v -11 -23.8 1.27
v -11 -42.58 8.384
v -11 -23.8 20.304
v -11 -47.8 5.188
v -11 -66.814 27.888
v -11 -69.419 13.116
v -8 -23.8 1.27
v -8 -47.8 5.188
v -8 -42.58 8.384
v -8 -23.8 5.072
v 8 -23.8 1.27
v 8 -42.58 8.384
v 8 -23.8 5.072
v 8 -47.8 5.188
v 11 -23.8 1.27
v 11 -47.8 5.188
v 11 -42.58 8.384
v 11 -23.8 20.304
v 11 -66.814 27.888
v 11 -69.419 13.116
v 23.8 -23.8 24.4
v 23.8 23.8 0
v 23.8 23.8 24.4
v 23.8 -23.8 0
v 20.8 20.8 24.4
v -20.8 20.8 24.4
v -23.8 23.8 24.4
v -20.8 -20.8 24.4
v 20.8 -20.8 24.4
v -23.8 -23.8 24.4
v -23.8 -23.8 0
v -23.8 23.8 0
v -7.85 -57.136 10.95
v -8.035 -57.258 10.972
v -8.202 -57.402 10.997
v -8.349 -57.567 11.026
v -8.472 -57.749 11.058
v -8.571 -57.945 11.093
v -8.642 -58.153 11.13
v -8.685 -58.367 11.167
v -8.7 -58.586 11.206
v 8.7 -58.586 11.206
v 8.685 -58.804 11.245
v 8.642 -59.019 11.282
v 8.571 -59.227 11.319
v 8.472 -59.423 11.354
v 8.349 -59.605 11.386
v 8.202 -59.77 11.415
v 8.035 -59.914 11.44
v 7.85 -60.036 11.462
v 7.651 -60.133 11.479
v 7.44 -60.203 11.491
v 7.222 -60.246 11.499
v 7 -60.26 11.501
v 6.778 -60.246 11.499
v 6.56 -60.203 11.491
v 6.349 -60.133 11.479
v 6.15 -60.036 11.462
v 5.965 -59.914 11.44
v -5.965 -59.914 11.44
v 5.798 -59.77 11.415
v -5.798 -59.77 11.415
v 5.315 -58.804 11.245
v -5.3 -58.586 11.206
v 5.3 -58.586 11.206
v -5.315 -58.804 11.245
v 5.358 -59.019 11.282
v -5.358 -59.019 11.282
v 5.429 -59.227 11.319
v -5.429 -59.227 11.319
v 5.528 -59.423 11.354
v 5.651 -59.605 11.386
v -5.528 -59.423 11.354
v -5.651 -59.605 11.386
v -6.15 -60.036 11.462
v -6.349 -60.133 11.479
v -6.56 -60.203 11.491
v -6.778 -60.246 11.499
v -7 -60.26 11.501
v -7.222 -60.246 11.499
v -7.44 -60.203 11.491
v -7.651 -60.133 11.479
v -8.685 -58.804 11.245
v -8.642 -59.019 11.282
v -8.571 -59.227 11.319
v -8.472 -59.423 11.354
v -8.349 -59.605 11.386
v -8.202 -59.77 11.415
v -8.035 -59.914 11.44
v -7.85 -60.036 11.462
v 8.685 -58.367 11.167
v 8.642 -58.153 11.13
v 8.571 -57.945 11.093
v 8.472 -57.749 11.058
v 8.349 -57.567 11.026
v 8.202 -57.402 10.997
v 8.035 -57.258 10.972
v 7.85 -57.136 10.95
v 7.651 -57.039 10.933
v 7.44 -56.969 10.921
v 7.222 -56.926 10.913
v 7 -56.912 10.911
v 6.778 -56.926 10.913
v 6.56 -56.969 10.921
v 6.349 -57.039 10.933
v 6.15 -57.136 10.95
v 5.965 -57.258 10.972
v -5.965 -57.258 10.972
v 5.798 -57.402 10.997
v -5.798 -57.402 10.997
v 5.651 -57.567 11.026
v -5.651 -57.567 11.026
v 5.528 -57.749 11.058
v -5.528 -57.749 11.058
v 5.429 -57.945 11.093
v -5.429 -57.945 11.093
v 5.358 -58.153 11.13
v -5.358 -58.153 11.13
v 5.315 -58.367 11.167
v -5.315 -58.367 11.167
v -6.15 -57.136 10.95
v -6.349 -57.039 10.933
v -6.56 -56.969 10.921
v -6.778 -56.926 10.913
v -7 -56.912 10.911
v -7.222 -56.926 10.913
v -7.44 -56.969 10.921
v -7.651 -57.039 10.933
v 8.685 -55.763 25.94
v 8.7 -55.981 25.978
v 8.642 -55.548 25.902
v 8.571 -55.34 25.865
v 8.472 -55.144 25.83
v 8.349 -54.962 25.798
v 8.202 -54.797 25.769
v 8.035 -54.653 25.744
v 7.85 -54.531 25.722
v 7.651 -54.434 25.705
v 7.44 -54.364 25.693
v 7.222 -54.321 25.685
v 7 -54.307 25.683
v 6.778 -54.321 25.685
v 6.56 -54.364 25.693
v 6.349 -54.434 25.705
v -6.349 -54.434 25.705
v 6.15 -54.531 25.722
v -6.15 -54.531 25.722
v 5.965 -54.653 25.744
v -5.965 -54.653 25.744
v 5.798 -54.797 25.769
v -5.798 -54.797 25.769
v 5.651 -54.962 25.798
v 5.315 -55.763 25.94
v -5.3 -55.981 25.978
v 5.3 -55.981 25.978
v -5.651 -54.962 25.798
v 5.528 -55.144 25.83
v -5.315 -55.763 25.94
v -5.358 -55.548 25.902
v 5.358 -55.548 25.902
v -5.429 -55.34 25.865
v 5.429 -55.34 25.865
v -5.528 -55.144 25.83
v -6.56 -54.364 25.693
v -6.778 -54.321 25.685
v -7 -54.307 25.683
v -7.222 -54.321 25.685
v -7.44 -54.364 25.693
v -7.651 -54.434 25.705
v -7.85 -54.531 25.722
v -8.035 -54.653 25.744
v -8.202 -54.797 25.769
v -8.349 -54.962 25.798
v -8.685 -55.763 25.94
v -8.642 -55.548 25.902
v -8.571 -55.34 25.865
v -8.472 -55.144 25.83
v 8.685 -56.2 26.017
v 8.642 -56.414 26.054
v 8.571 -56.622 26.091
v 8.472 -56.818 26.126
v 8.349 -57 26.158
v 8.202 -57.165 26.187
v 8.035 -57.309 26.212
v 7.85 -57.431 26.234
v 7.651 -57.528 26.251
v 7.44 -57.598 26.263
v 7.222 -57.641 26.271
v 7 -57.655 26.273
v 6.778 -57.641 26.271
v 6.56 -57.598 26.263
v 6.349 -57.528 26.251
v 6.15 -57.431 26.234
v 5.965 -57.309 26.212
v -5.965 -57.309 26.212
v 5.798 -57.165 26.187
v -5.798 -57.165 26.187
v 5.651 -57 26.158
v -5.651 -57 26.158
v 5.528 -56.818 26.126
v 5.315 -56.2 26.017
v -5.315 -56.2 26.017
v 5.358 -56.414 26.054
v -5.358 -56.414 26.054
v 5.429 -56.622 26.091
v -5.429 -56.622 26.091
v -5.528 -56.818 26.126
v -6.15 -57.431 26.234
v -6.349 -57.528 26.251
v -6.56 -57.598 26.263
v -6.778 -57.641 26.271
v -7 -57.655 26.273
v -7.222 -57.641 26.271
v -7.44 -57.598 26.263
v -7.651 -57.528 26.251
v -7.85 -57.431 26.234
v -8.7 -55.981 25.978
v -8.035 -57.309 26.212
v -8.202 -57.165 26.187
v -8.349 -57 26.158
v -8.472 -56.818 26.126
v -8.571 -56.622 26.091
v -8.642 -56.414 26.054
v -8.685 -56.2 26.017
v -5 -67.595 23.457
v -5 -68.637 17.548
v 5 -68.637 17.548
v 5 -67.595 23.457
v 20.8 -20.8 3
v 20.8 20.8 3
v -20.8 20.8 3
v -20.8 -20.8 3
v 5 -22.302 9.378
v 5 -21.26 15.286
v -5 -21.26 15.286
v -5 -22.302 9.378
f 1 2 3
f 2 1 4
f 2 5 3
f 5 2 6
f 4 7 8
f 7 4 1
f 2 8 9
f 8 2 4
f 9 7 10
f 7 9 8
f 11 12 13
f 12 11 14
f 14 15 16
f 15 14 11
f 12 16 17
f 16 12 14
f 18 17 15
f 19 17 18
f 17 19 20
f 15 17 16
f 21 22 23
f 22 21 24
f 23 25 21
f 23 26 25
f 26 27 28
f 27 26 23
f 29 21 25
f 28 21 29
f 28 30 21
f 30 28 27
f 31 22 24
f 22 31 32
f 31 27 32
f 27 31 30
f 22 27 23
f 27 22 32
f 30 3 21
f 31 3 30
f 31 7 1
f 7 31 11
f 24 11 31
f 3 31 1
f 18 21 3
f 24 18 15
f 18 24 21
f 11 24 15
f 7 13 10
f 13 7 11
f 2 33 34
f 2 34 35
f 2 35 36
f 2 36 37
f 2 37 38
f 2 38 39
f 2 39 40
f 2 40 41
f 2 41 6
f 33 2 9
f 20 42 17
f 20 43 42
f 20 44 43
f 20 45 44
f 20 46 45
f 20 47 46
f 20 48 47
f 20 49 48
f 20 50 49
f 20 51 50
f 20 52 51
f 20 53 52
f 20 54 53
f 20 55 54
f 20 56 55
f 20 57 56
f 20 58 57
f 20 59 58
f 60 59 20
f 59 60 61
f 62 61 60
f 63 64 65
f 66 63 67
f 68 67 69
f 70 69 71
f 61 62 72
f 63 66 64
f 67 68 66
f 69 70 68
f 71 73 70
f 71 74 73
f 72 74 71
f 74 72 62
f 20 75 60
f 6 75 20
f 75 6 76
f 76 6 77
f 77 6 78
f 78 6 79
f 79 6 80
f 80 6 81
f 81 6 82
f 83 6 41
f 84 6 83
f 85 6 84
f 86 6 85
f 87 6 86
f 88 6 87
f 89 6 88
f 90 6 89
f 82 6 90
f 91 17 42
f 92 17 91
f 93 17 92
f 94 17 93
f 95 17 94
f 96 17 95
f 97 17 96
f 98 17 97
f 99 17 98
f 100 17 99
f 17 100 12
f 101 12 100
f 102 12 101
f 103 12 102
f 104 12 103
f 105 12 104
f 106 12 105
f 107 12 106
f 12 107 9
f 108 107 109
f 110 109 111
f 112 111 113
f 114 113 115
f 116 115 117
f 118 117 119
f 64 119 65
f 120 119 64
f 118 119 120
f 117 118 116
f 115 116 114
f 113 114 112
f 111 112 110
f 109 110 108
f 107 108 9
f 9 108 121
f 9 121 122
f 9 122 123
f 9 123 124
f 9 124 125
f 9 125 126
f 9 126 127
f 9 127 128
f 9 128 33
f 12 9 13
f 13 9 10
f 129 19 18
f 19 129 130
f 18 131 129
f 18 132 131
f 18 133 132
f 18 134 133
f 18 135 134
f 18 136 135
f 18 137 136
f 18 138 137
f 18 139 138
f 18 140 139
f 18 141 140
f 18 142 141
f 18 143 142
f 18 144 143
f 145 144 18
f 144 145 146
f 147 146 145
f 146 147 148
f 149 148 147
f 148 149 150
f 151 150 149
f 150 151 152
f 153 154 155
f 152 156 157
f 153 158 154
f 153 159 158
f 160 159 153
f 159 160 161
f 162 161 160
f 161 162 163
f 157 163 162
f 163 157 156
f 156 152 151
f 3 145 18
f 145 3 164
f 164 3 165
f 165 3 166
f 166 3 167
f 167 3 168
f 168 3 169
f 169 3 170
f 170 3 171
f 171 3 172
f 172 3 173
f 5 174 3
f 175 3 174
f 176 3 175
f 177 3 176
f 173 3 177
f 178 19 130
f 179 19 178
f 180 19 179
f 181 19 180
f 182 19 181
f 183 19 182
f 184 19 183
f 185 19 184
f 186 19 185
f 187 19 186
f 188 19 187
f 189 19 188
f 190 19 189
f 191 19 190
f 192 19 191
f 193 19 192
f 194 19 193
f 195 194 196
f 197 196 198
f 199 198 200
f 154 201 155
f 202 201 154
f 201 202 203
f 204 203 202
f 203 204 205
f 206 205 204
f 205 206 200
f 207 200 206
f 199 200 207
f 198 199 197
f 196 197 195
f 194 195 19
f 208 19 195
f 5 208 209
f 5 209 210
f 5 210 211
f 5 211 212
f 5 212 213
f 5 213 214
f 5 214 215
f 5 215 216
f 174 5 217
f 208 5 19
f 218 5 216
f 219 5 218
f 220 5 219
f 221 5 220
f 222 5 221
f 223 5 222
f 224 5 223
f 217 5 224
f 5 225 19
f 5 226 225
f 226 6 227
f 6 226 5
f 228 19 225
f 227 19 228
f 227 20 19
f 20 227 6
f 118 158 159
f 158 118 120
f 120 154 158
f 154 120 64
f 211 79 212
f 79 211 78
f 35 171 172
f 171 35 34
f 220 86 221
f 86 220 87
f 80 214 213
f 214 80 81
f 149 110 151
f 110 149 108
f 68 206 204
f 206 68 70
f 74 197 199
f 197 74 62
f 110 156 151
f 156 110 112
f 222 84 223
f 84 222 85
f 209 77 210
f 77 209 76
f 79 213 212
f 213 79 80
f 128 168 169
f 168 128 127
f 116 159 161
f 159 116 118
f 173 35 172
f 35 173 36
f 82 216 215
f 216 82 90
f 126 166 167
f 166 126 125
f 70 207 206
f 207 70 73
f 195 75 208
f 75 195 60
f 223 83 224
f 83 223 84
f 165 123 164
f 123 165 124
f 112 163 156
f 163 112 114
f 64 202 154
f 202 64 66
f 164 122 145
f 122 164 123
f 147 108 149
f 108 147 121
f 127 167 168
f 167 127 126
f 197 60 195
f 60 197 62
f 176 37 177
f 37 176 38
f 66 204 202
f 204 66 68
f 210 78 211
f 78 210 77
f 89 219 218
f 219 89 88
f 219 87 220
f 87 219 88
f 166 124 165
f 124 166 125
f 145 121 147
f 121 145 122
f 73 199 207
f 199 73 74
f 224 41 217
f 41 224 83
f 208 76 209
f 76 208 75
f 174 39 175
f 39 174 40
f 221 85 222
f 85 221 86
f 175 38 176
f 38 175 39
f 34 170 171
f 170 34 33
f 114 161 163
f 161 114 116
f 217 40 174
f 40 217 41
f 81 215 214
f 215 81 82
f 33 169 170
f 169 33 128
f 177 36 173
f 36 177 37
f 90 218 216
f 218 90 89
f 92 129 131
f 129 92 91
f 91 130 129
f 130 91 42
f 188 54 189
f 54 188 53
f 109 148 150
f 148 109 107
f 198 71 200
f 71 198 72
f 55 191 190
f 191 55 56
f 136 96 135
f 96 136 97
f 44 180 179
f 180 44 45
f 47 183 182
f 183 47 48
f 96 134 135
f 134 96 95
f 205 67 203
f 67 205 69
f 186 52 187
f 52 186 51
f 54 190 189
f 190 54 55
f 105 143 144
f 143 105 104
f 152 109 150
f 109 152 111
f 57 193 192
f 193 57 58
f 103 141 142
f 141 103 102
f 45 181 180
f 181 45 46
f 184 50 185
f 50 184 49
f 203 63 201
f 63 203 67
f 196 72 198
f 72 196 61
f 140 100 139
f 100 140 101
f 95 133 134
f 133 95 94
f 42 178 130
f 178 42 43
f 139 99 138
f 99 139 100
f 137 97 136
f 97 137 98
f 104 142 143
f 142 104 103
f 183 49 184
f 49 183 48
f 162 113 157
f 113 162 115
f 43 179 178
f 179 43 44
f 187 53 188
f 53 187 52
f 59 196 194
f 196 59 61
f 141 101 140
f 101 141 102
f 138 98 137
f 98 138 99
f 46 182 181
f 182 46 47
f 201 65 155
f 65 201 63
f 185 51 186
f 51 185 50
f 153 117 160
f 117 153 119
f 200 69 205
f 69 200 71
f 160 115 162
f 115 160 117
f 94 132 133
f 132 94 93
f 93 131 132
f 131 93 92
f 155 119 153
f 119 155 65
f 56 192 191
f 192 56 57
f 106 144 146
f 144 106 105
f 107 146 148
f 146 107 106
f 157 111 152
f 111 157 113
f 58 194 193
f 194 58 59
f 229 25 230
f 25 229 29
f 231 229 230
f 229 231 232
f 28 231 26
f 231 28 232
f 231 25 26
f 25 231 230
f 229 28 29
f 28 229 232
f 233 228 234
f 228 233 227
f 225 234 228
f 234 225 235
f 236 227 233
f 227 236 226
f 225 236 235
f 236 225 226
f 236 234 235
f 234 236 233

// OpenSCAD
// Parametric open-top holder with an angled hollow handle.
// Units: millimeters.

$fn = 48;
eps = 0.05;

// Insert object.
insert_x = 41.0;
insert_y = 41.0;
insert_z = 21.0;

// Fit clearance. Start with 0.6 mm total XY clearance for FDM printing.
clearance_xy = 0.6;
clearance_z = 0.4;

// Holder shell.
wall = 3.0;
bottom = 3.0;

// Handle.
handle_length = 45.0;
handle_width = 22.0;
handle_height = 15.0;
handle_angle_deg = 100.0; // 90 = straight back, 100 = 10 degrees upward.
handle_root_overlap = 2.0;
handle_attach_z_ratio = 0.52;

// Cable channel inside the handle.
cable_channel_width = 10.0;
cable_channel_height = 6.0;

// Mounting holes through the handle. Disable if you will use a clamp instead.
use_mounting_holes = true;
mount_hole_diameter = 3.4; // M3 clearance hole.
mount_hole_spacing_x = 14.0;
mount_hole_distance_from_shell = 34.0;

// Print a small ring first to test whether the real 41 mm part fits.
build_fit_test_ring = false;
fit_test_height = 8.0;

inner_x = insert_x + clearance_xy;
inner_y = insert_y + clearance_xy;
inner_z = insert_z + clearance_z;

outer_x = inner_x + wall * 2;
outer_y = inner_y + wall * 2;
outer_z = inner_z + bottom;

handle_tilt_deg = handle_angle_deg - 90.0;
handle_attach_z = outer_z * handle_attach_z_ratio;

module shell_solid(height = outer_z) {
    translate([-outer_x / 2, -outer_y / 2, 0])
        cube([outer_x, outer_y, height]);
}

module shell_cavity_cut(height = outer_z) {
    translate([-inner_x / 2, -inner_y / 2, bottom])
        cube([inner_x, inner_y, height - bottom + 2 * eps]);
}

module handle_transform() {
    translate([0, -outer_y / 2, handle_attach_z])
        rotate([-handle_tilt_deg, 0, 0])
            children();
}

module handle_solid() {
    handle_transform()
        translate([-handle_width / 2, -handle_length, -handle_height / 2])
            cube([handle_width, handle_length + handle_root_overlap, handle_height]);
}

module cable_channel_cut() {
    handle_transform()
        translate([
            -cable_channel_width / 2,
            -handle_length - eps,
            -cable_channel_height / 2
        ])
            cube([
                cable_channel_width,
                handle_length + handle_root_overlap + 2 * eps,
                cable_channel_height
            ]);
}

module mounting_holes_cut() {
    if (use_mounting_holes) {
        handle_transform() {
            for (x = [-mount_hole_spacing_x / 2, mount_hole_spacing_x / 2]) {
                translate([x, -mount_hole_distance_from_shell, 0])
                    cylinder(h = handle_height + 2 * eps, d = mount_hole_diameter, center = true);
            }
        }
    }
}

module side_ribs() {
    rib_w = 3.0;
    rib_len = 24.0;
    rib_z0 = max(1.0, handle_attach_z - handle_height / 2 - 4.0);
    rib_z1 = min(outer_z, handle_attach_z + handle_height / 2);
    rib_z2 = handle_attach_z - handle_height / 2;
    y0 = -outer_y / 2 + 0.5;
    y1 = -outer_y / 2 - rib_len;

    for (x = [-handle_width / 2 + rib_w / 2, handle_width / 2 - rib_w / 2]) {
        translate([x - rib_w / 2, 0, 0])
            polyhedron(
                points = [
                    [0, y0, rib_z0],
                    [rib_w, y0, rib_z0],
                    [0, y0, rib_z1],
                    [rib_w, y0, rib_z1],
                    [0, y1, rib_z2],
                    [rib_w, y1, rib_z2]
                ],
                faces = [
                    [0, 2, 4],
                    [1, 5, 3],
                    [0, 1, 3, 2],
                    [2, 3, 5, 4],
                    [4, 5, 1, 0]
                ]
            );
    }
}

module full_holder() {
    difference() {
        union() {
            shell_solid();
            handle_solid();
            side_ribs();
        }

        shell_cavity_cut();
        cable_channel_cut();
        mounting_holes_cut();
    }
}

module fit_test_ring() {
    difference() {
        shell_solid(fit_test_height);
        translate([-inner_x / 2, -inner_y / 2, -eps])
            cube([inner_x, inner_y, fit_test_height + 2 * eps]);
    }
}

if (build_fit_test_ring) {
    fit_test_ring();
} else {
    full_holder();
}
